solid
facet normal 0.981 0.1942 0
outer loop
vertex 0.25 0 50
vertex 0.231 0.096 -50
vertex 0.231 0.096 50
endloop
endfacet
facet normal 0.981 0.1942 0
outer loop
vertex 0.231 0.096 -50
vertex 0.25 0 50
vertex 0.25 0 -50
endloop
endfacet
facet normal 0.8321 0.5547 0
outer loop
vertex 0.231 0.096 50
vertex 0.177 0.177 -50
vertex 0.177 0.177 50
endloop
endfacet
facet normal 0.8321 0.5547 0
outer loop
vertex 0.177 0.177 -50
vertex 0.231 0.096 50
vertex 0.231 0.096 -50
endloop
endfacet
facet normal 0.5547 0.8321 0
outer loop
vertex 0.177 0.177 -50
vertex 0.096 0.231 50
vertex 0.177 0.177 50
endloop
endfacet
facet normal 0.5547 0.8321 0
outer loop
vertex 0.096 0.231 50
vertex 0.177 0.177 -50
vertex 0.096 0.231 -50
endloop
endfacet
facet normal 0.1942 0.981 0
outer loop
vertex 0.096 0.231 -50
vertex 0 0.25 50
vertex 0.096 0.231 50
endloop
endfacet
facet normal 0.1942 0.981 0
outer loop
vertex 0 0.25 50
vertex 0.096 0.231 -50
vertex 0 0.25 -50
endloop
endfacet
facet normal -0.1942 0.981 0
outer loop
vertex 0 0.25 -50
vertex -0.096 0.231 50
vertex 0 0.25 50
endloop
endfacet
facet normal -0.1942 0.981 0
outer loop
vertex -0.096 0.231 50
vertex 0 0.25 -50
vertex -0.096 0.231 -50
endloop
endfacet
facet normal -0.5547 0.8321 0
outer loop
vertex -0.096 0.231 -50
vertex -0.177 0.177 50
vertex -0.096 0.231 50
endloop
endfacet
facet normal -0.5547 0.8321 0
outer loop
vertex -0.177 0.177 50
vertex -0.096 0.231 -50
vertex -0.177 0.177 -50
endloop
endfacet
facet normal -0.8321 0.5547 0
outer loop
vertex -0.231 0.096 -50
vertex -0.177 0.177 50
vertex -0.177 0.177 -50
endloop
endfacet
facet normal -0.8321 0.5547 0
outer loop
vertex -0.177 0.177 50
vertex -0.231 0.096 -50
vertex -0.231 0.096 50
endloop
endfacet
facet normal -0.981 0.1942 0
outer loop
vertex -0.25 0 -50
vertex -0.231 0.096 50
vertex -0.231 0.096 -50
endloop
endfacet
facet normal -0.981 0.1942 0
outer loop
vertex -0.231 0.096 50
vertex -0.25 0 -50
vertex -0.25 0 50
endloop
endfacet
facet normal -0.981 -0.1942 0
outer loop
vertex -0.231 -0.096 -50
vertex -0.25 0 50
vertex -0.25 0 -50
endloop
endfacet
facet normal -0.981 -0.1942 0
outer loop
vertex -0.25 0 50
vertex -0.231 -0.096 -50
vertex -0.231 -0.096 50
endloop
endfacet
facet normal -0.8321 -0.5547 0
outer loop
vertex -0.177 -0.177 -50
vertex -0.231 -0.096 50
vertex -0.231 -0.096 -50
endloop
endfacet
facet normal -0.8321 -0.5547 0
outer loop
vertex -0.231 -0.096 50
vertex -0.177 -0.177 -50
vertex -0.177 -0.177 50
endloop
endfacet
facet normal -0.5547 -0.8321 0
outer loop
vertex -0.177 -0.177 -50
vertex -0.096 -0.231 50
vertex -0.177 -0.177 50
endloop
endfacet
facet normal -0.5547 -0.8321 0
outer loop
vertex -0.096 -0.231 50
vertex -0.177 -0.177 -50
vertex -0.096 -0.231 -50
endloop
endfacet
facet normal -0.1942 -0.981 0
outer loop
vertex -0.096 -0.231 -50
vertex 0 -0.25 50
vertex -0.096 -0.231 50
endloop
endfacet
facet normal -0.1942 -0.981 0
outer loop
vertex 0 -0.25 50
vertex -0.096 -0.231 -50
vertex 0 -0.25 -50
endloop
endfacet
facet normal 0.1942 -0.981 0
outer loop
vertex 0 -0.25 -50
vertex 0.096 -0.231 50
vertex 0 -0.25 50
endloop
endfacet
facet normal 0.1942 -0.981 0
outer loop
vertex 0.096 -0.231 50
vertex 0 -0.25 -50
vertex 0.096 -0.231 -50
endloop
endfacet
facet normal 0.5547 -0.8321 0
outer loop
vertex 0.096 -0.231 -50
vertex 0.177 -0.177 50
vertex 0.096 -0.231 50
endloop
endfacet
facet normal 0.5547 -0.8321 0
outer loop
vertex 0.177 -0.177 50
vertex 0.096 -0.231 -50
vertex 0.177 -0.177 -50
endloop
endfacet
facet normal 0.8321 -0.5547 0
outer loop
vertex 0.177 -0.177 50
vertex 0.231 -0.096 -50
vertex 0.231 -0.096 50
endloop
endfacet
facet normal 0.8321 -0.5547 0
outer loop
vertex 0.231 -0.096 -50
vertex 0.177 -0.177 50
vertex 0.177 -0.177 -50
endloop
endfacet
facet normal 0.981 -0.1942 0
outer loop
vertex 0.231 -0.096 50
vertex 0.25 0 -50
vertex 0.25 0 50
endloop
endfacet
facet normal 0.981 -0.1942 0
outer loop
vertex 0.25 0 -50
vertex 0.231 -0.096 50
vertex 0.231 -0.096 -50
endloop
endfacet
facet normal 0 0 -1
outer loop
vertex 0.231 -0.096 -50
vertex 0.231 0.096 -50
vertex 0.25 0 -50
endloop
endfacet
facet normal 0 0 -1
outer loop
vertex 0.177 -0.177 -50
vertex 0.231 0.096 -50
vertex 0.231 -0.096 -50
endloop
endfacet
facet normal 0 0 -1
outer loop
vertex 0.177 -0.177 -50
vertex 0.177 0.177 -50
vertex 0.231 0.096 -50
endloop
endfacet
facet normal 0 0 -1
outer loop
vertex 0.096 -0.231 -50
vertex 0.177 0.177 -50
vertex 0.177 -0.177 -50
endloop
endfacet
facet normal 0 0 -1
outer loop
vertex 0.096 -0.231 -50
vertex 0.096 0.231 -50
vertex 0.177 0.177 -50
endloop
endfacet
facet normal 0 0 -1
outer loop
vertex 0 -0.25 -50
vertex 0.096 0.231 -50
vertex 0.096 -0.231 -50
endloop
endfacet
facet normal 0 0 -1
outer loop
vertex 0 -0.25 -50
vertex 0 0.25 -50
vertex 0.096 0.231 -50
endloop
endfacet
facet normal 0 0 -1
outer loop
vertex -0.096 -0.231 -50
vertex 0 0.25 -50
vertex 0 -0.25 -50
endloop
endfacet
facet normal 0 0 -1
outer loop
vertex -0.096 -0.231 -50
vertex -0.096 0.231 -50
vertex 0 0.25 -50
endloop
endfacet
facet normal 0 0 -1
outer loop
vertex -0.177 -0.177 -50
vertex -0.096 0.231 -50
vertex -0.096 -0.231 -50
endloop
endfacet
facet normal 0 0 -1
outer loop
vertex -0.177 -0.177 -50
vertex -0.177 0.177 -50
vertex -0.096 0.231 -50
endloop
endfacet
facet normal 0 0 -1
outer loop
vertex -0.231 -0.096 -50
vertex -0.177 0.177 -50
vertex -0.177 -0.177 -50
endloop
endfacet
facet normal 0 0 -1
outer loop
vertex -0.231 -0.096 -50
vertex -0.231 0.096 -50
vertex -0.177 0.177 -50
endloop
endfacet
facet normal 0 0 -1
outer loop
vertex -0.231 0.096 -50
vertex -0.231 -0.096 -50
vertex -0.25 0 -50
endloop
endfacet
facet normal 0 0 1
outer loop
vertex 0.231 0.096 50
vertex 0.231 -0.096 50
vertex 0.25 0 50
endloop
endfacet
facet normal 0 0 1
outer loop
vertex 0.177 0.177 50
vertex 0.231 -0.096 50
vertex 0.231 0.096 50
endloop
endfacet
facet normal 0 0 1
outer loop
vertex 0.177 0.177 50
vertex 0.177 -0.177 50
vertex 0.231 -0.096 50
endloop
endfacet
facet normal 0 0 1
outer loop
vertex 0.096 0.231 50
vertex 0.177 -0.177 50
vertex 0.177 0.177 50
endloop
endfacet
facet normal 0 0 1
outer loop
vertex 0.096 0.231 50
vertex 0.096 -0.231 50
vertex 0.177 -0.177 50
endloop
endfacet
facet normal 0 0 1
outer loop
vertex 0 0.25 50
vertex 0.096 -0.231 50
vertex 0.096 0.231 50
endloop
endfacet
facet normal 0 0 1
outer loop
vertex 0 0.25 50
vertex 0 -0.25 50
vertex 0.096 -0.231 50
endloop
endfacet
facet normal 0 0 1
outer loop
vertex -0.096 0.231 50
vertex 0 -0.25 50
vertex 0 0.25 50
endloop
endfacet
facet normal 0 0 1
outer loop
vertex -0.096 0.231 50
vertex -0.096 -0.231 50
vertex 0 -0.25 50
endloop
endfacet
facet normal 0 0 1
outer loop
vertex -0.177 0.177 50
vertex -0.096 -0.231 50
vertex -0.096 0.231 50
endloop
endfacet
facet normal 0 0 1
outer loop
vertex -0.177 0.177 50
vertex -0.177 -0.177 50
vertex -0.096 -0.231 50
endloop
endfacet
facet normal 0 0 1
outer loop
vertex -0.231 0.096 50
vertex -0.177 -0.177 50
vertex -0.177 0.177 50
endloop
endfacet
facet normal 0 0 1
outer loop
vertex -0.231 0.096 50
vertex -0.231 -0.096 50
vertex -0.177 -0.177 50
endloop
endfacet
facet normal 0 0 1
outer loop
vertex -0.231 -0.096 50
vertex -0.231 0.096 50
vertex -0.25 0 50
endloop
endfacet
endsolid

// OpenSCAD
module BoltHole(x=0, y=0, r=0.25) {
    translate([x, y, 0])
        cylinder(r=r, h=100, center=true, $fn=16);
}

BoltHole();
